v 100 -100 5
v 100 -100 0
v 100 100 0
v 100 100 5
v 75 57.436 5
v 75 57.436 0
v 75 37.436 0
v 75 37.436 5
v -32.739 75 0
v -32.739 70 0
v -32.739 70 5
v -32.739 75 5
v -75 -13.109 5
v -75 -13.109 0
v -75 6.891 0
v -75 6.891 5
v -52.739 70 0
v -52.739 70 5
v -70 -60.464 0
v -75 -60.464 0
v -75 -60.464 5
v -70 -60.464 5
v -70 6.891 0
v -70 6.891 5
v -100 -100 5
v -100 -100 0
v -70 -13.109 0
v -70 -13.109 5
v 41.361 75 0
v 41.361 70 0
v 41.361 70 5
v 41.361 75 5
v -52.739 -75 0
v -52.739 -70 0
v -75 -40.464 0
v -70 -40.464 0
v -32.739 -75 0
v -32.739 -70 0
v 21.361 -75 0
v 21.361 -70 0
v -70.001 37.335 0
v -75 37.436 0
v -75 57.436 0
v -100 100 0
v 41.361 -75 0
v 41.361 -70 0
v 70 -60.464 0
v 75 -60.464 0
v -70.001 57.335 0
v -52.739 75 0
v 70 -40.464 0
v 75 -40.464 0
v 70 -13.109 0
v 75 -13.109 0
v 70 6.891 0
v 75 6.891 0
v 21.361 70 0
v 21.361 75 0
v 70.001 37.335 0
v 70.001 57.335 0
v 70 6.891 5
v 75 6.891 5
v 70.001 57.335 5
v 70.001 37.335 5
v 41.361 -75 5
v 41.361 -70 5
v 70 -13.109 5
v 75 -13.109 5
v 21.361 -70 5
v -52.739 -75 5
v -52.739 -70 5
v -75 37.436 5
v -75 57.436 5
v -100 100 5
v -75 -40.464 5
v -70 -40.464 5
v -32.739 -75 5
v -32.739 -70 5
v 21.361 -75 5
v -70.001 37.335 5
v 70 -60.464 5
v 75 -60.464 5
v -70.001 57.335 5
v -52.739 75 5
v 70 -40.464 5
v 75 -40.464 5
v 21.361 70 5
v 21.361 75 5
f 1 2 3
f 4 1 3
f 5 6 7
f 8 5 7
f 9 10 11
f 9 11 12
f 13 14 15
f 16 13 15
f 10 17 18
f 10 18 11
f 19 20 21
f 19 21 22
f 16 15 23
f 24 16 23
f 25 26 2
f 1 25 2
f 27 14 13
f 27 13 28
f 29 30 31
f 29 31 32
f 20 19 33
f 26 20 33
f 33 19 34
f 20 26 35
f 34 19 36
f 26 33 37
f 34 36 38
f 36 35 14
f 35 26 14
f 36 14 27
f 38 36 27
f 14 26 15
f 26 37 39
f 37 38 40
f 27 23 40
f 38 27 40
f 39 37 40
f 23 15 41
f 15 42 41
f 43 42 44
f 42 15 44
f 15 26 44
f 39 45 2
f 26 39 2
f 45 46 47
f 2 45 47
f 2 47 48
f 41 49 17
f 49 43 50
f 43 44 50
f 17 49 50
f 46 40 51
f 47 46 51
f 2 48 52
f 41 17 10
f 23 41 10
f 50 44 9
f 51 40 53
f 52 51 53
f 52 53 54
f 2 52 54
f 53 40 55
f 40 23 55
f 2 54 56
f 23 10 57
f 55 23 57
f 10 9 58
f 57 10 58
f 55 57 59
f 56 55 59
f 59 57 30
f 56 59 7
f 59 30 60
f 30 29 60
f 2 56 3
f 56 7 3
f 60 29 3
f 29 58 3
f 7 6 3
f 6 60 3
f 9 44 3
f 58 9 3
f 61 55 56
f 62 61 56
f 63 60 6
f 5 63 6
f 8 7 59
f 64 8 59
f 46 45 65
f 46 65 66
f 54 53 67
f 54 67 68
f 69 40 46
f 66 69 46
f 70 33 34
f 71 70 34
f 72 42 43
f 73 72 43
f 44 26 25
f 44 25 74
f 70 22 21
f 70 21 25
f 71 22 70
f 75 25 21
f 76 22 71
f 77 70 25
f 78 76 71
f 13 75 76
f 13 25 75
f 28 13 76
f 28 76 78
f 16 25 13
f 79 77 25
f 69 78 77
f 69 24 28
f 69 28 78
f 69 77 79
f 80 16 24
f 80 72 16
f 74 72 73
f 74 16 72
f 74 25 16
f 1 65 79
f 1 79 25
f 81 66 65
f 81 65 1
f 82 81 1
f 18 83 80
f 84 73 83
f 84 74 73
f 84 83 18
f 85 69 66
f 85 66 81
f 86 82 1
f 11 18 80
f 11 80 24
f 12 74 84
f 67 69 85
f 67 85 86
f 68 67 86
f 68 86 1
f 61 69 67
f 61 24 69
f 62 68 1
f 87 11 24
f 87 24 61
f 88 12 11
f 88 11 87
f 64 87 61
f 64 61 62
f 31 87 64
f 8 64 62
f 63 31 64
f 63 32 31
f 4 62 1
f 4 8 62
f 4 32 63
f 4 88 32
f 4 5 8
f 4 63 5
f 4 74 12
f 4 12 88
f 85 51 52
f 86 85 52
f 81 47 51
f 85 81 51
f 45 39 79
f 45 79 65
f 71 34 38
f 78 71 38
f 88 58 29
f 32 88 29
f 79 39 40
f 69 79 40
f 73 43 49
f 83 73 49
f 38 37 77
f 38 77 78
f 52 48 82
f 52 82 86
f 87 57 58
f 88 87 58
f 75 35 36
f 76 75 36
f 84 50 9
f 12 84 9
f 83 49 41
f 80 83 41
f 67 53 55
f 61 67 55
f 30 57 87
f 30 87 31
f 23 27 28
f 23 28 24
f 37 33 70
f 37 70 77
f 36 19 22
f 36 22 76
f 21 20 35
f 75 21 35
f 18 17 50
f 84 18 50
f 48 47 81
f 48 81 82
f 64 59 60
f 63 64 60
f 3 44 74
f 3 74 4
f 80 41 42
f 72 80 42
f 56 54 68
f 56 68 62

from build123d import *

# Parameters (mm, degrees)
SKETCH1_W           = 200
SKETCH1_H           = 200
SKETCH1_W_2         = 20
SKETCH1_H_2         = 5
SKETCH1_W_3         = 5
SKETCH1_H_3         = 20
BOSS_EXTRUDE1_DEPTH = 5


with BuildPart() as part:
    # Sketch1 → Boss-Extrude1 (new body)
    with BuildSketch(Plane.XY):
        Rectangle(SKETCH1_W, SKETCH1_H)
        with Locations((-42.738744268, 72.5)):
            Rectangle(SKETCH1_W_2, SKETCH1_H_2, mode=Mode.SUBTRACT)
        with Locations((31.360897281, 72.5)):
            Rectangle(SKETCH1_W_2, SKETCH1_H_2, mode=Mode.SUBTRACT)
        Polygon((-75, 57.435704121), (-70.001007164, 57.335351613), (-70.001007164, 37.335351613), (-75, 37.435704121), align=None, mode=Mode.SUBTRACT)
        with Locations((-72.5, -3.109084485)):
            Rectangle(SKETCH1_W_3, SKETCH1_H_3, mode=Mode.SUBTRACT)
        with Locations((-72.5, -50.464153422)):
            Rectangle(SKETCH1_W_3, SKETCH1_H_3, mode=Mode.SUBTRACT)
        with Locations((31.360897281, -72.5)):
            Rectangle(SKETCH1_W_2, SKETCH1_H_2, mode=Mode.SUBTRACT)
        with Locations((-42.738744268, -72.5)):
            Rectangle(SKETCH1_W_2, SKETCH1_H_2, mode=Mode.SUBTRACT)
        with Locations((72.5, -50.464153422)):
            Rectangle(SKETCH1_W_3, SKETCH1_H_3, mode=Mode.SUBTRACT)
        with Locations((72.5, -3.109084485)):
            Rectangle(SKETCH1_W_3, SKETCH1_H_3, mode=Mode.SUBTRACT)
        Polygon((75, 37.435704121), (70.001007164, 37.335351613), (70.001007164, 57.335351613), (75, 57.435704121), align=None, mode=Mode.SUBTRACT)
    extrude(amount=BOSS_EXTRUDE1_DEPTH)


solid = part.part
